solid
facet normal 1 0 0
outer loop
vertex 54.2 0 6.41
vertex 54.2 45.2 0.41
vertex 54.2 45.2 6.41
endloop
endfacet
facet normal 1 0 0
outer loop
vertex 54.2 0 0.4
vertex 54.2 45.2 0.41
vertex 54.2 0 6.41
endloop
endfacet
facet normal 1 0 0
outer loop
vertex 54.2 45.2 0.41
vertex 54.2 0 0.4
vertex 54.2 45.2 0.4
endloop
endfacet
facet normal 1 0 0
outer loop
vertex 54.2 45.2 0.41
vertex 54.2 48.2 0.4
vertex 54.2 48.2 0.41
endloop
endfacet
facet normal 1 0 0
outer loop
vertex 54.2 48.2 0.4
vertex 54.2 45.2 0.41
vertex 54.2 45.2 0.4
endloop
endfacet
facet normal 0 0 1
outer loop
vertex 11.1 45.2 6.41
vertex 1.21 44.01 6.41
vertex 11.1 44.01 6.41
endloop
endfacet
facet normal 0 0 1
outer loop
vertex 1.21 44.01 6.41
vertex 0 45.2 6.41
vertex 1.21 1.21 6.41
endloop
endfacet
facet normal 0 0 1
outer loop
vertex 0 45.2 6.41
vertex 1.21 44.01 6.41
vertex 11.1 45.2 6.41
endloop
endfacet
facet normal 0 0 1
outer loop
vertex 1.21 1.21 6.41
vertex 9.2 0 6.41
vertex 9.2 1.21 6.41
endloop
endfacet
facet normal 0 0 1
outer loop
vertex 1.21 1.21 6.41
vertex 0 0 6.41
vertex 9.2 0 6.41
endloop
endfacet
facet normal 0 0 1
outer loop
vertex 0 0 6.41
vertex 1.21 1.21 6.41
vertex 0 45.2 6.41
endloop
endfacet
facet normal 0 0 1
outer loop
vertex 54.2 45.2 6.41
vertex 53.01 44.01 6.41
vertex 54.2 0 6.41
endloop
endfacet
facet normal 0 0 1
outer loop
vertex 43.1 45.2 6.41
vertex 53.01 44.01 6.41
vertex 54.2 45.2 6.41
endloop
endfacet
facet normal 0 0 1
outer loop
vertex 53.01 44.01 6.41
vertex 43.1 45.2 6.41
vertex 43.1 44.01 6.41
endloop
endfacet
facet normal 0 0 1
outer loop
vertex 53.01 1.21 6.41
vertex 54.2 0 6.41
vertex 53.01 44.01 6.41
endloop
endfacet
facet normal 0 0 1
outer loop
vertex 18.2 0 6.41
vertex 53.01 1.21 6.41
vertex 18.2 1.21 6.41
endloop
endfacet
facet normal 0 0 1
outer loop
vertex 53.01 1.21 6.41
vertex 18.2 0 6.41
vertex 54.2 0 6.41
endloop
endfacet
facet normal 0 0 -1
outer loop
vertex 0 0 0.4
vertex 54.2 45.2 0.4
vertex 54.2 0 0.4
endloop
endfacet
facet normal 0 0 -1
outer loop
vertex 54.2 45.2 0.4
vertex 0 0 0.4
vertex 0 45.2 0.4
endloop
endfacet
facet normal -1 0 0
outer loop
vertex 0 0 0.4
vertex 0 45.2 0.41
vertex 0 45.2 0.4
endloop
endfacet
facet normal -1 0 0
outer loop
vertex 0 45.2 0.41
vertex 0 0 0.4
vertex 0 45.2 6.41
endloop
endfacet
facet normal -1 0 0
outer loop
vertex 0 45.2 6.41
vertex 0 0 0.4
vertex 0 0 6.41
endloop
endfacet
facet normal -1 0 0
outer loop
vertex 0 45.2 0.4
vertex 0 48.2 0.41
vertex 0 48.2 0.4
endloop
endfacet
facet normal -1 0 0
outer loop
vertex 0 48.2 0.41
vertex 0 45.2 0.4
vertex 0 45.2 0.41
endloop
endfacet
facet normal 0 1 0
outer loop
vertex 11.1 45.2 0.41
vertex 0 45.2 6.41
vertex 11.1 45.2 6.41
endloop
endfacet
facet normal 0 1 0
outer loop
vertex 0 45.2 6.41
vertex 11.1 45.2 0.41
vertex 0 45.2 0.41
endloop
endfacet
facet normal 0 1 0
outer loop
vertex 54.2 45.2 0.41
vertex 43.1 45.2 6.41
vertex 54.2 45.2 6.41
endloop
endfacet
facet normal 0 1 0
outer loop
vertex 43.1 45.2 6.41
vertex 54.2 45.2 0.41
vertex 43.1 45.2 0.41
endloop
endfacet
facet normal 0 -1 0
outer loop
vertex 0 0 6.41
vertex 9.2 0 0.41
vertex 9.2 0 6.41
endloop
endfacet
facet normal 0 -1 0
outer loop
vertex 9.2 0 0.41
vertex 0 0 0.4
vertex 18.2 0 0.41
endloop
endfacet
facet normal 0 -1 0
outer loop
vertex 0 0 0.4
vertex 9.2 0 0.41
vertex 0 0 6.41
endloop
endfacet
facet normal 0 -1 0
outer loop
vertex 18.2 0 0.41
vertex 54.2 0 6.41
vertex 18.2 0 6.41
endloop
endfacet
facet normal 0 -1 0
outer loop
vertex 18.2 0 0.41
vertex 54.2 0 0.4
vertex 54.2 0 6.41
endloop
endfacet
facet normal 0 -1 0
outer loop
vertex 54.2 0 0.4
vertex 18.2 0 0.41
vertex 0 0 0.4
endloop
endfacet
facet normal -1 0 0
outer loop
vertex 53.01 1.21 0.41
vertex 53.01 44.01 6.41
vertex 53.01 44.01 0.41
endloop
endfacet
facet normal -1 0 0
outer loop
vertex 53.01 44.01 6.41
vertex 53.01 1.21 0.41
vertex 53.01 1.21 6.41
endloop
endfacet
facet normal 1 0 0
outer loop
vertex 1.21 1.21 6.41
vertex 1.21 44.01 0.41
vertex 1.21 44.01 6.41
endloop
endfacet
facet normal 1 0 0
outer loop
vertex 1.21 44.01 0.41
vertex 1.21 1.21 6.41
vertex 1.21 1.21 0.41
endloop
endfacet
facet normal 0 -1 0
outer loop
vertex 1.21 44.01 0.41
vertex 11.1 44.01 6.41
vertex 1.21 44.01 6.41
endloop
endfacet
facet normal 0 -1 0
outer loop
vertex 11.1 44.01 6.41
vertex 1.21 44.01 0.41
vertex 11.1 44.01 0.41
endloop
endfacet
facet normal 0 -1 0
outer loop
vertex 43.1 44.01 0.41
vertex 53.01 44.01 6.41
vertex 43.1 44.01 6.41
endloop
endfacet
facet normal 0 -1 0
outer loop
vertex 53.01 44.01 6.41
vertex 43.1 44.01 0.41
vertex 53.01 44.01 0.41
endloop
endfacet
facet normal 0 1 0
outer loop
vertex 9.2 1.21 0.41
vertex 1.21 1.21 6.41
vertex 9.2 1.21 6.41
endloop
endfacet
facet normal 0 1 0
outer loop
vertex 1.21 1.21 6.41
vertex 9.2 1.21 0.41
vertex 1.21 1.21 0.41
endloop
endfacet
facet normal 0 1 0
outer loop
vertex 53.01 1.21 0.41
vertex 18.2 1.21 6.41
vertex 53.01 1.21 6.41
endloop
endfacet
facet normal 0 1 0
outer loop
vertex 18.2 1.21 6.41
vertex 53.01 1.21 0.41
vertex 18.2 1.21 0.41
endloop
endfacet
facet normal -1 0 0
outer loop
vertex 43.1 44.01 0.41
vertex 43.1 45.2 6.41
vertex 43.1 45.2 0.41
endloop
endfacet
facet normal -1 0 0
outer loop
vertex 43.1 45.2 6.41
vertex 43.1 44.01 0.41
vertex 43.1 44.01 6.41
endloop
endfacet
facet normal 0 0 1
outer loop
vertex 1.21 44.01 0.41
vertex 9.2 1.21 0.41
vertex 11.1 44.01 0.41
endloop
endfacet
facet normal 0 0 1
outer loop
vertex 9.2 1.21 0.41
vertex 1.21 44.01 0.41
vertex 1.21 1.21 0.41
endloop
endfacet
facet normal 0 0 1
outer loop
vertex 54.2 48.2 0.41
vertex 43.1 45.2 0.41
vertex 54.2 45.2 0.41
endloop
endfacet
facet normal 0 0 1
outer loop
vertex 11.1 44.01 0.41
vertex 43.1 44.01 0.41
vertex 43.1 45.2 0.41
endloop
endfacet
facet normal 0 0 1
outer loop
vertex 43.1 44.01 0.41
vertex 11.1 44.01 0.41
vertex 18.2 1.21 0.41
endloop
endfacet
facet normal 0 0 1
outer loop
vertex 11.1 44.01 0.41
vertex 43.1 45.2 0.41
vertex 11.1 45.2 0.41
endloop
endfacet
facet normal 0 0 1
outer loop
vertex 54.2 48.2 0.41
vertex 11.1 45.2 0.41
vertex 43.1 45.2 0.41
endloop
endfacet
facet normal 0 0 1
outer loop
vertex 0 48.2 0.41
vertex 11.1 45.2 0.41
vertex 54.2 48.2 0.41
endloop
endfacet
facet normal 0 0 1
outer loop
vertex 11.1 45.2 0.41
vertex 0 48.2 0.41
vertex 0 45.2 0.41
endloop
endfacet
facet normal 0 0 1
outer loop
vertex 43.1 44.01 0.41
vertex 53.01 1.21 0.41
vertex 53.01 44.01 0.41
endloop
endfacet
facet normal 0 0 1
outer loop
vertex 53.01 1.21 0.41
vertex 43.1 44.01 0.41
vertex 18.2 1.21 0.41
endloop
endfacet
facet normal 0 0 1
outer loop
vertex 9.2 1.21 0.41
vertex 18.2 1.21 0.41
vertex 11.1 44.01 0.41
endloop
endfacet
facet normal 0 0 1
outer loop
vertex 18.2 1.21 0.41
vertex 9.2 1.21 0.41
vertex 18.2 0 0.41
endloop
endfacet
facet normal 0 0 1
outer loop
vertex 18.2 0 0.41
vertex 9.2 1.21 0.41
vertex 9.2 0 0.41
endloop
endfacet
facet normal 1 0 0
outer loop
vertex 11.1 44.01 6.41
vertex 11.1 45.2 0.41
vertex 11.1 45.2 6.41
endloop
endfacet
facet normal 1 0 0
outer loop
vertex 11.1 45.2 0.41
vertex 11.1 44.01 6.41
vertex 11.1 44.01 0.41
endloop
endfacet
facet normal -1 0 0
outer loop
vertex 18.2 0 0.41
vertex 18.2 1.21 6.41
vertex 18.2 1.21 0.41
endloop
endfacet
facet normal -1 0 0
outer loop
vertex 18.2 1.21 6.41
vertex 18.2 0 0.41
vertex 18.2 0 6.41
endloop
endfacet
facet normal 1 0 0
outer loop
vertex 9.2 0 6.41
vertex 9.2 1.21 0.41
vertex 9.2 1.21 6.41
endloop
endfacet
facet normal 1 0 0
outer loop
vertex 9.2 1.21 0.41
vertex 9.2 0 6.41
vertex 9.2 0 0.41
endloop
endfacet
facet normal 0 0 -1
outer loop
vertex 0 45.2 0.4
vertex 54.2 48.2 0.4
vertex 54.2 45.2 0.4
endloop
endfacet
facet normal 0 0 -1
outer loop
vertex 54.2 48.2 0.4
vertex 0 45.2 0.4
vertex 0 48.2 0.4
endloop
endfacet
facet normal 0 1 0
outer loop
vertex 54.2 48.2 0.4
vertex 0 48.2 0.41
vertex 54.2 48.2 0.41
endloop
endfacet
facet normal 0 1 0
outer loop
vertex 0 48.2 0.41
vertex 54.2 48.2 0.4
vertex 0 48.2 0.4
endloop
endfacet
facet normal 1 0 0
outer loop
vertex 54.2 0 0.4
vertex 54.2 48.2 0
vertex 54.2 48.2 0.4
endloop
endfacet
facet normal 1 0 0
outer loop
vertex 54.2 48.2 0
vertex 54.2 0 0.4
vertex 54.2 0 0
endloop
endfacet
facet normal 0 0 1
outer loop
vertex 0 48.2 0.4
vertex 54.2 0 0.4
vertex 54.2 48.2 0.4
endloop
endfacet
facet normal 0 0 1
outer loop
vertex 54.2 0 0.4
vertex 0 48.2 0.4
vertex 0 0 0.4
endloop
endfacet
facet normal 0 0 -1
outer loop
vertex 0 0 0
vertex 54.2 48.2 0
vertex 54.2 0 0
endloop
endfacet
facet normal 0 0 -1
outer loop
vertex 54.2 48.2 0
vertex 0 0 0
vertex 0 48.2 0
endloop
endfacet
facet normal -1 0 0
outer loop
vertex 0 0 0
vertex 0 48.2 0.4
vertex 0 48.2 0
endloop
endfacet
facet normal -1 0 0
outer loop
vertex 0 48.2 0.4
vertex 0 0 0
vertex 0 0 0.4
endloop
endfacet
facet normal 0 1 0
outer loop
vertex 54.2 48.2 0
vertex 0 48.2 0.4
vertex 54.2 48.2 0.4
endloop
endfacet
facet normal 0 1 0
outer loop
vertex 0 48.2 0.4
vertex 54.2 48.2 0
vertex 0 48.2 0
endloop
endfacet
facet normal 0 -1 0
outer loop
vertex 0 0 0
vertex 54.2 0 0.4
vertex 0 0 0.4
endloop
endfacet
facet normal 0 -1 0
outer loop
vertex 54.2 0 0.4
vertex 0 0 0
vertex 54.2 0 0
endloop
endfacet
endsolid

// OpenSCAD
// file: ../../Base/Boxes.scad
// Fischertechnik Box Foundation
// Pre-designed Boxes

use <Constants.scad>

include <PlacementOptions.scad>

box190Width = 190;
box190Depth = 130;
box130Width = 130;
box130Depth = 95;

// Values are from an original ec3 box
topBottomDifference = 1.5;
outerHeight = 40;
innerHeight = 38.2;
baseThickness = outerHeight - innerHeight;
stackExcess = 5.7;
radius = 3.5;
wallThickness = 1.5;
tolerance = 0.2;
stackOffset = innerHeight - stackExcess;

boxUsageHeight = stackOffset;
boxWallThickness = wallThickness;
boxBaseThickness = baseThickness;
boxWebWidth = 3.0;

// getBoxWallThickness()
// Gets the wall thickness of a Fischertechnik Box
function getBoxWallThickness() = boxWallThickness;

// getBoxUsageHeight()
// Gets the usable height of a Fischertechnik box
function getBoxUsageHeight() = boxUsageHeight;

// getBoxInnerHeight()
// Gets the inner height of a Fischertechnik box, including the stack excess
function getBoxInnerHeight() = innerHeight;

// getBoxBaseThickness()
// Gets the thickness of the Fischertechnik box base.
function getBoxBaseThickness() = boxBaseThickness;

// getBoxWebWidth()
// Gets the width of a box web
function getBoxWebWidth() = boxWebWidth;

// getBox190Space()
// Gets the usable inner space of a Box 190 as an x/y-list
function getBox190Space() = [
    box190Width - 2*getBoxWallThickness() - topBottomDifference, 
    box190Depth - 2*getBoxWallThickness() - topBottomDifference ];

// BoxBase(width, depth)
// Creates an empty stackable Fischertechnik compatible box
// width = Outer width of the box (190, 130, ...)
// depth = Outer depth of the box (130, 95, ...)

module BoxBase(width, depth, height=outerHeight) {    
    thinPlate = 0.01;

    innerHeight = height - baseThickness;    
    
    module BodyPlate(width, depth) {
        translate([radius, radius])
        hull() {
            w = width-2*radius;
            d = depth-2*radius;
            cube([w, d, thinPlate]);
            cylinder(thinPlate, r=radius, $fn=getFragments());
            translate([w, 0])
                cylinder(thinPlate, r=radius, $fn=getFragments());
            translate([w, d])
                cylinder(thinPlate, r=radius, $fn=getFragments());
            translate([0, d])
                cylinder(thinPlate, r=radius, $fn=getFragments());
        }
    }
    
    module Body(tolerance=tolerance) {
        hull() {
            // Bottom with tolerance to fit into the original boxes when stacked
            translate([-wallThickness+tolerance, -wallThickness+tolerance, -baseThickness])
                BodyPlate(width-topBottomDifference-2*tolerance, depth-topBottomDifference-2*tolerance);
            
            // Top
            translate([-wallThickness-topBottomDifference/2, -wallThickness-topBottomDifference/2, innerHeight-thinPlate])
                BodyPlate(width, depth);
         }
    }

    module Cutoff() {
        hull() {
            coWidth = width - 2*wallThickness;
            coDepth = depth - 2*wallThickness;
            
            // Bottom
            BodyPlate(coWidth-topBottomDifference, coDepth-topBottomDifference);

            // Top
            translate([-topBottomDifference/2, -topBottomDifference/2, innerHeight+thinPlate]) 
                BodyPlate(coWidth, coDepth);
        }
    }
    
    difference() {        
        Body();
        Cutoff();
        stackOffset = innerHeight - stackExcess;
        translate([0, 0, stackOffset + baseThickness])
            Body(tolerance=0);
    }
}

// Creates the Fischertechnik empty box 130x190 mm and places it at position 0,0
// 190x130 are the outer sizes, the inner space is slightly smaller. Use getBox190Space() to get the inner sizes.
// The box is positioned that the usable inner space is at the 0,0,0 position. The

module Box190() {
    BoxBase(box190Width, box190Depth);
}

// Gets the usable inner space of a Box 130 as an x/y-list
function getBox130Space() = [
    box130Width - 2*getBoxWallThickness() - topBottomDifference, 
    box130Depth - 2*getBoxWallThickness() - topBottomDifference ];

// Creates the Fischertechnik empty box 95x130 mm and places it at position 0,0
// 190x130 are the outer sizes, the inner space is slightly smaller. Use getBox190Space() to get the inner sizes.
// The box is positioned that the usable inner space is at the 0,0,0 position. The

module Box130() {
    BoxBase(box130Width, box130Depth);
}

// Creates a web at the specified box walls
// corner 0 = LowerLeft, 1 = UpperLeft, 2 = UpperRight, 3 = LowerRight
// side 0 = LeftOfCorner, 1 = RightOfCorner
// distance = Distance in mm from the corner
// boxSpace = inner width and depth of the box (default: Box 190)
// webWidth = length of the web (default is 3 mms)
// webThickness = thickness of the web (default is 1 mm)

module BoxWeb(corner, side, distance, boxSpace=getBox190Space(), webWidth=getBoxWebWidth(), webThickness=1.0) {
    sink = getBoxWallThickness()/2;

    width = (corner % 2 == 0) ? 
            (side == LeftOfCorner ? webWidth : webThickness) :
            (side == LeftOfCorner ? webThickness : webWidth);

    depth = (corner % 2 == 0) ? 
            (side == RightOfCorner ? webWidth : webThickness) :
            (side == RightOfCorner ? webThickness : webWidth);
    
    xDiff = corner == LowerLeft ? 
                (side == LeftOfCorner ? -sink : distance) :
            (corner == UpperLeft ?                
                (side == LeftOfCorner ? distance : -sink) :
            (corner == UpperRight ?
                (side == LeftOfCorner ? boxSpace.x-webWidth+sink : boxSpace.x-distance-webThickness) :
                (side == LeftOfCorner ? boxSpace.x-distance-webThickness: boxSpace.x-webWidth+sink)));

    yDiff = corner == LowerLeft ? 
                (side == RightOfCorner ? -sink : distance) :
            (corner == UpperLeft ?
                (side == RightOfCorner ? boxSpace.y-distance : boxSpace.y-webWidth+sink) :
            (corner == UpperRight ?
                (side == RightOfCorner ? boxSpace.y-webWidth+sink : boxSpace.y-distance) :
                (side == RightOfCorner ? distance : -sink)));
    
    translate([xDiff, yDiff, -getExcess()])
        cube([width, depth, boxUsageHeight + 2*getExcess()]);
}
// file: ../../Base/Rotation.scad
// Fischertechnik Box Foundation
// Geometry Helpers Rotation

include <PlacementOptions.scad>

// getRotatedSpace(space, rotation=NoRotation)
// Rotates the space dependent on the specified rotation

function getRotatedSpace(space, rotation=NoRotation) = [
    (rotation == Rotate90 || rotation == Rotate270) ? space.y : space.x,
    (rotation == Rotate90 || rotation == Rotate270) ? space.x : space.y
];

// Rotates the given space around the fixed left lower corner
// space = the space the children needs as width/depth list [width,depth]
// rotation = 0 Rotate0 degrees, 1 Rotate90 degrees, 2 Rotate180 degrees, 3 Rotate270 degrees (equivalent to -90)

module RotateFix(space, rotation=NoRotation) {
    dy = (rotation == Rotate0 || rotation == Rotate270) ? 0 :
        (rotation == Rotate90) ? space.x :
        space.y;
    dx = (rotation < Rotate180) ? 0 :
        (rotation == Rotate180) ? space.x :
        space.y;
    
    translate([dx, dy, 0])
        rotate([0, 0, rotations[rotation]])
            children();
}
// file: ../../Base/Alignment.scad
// Fischertechnik Box Foundation
// Geometry Helpers Alignment

include <PlacementOptions.scad>

// getAlignedX(elementWidth, spaceWidth, align=AlignRight, offset=0)
// Gets the aligned X offset of an element with the given
// width in the given space.
// elementWidth = The width of the element to positon
// spaceWidth = The space where the element should be aligned
// align = 0 AlignLeft, 1 AlignCenter, 2 AlignRight
// offset = an optional offset from the aligned position. When
// aligned left or centered, then positive values are in X direction.
// When aligned right then positive values are in negative X direction.

function getAlignedX(elementWidth, spaceWidth, align=AlignRight, offset=0) =
    (align == AlignLeft) ?
        offset :
        ((align == AlignCenter) ?
        (spaceWidth - elementWidth)/2 + offset :
        spaceWidth - offset - elementWidth);

// getAlignedY(elementDepth, spaceDepth, align=AlignTop, offset=0)
// Gets the aligned Y offset of an element with the given
// depth in the given space.
// elementDepth = The depth of the element to positon
// spaceDepth = The space where the element should be aligned
// align = 0 AlignBottom, 1 AlignCenter, 2 AlignTop
// offset = an optional offset from the aligned position. When
// aligned bottom or centered, then positive values are in Y direction.
// When aligned top then positive values are in negative Y direction.

function getAlignedY(elementDepth, spaceDepth, align=AlignTop, offset=0) =
    (align == AlignBottom) ?
        offset :
        ((align == AlignCenter) ?
        (spaceDepth - elementDepth)/2 + offset :
        spaceDepth - offset - elementDepth);
// file: ../../Base/PlacementOptions.scad
// Fischertechnik Box Foundation
// Placement Options

// Alignment
NoAlign = 0;
AlignLeft = 1;
AlignBottom = 2;
AlignCenter = 3;
AlignRight = 4;
AlignTop = 5;

// Element rotation degree steps
rotations = [0, -90, -180, -270];

// Rotation
NoRotation = 0;
Rotate0 = 0;
Rotate90 = 1;
Rotate180 = 2;
Rotate270 = 3;

// Docking (seen from above)
NoDock = -1;
DockLeft = 0;
DockTop = 1;
DockRight = 2;
DockCorner = 2;
DockBottom = 3;

// Web corners
LowerLeft = 0;
UpperLeft = 1;
UpperRight = 2;
LowerRight = 3;

// Web position relative to corner
LeftOfCorner = 0;
RightOfCorner = 1;
// file: ../../Base/Placement.scad
// Fischertechnik Box Foundation
// Geometry Helpers Placement

use <Constants.scad>
use <Alignment.scad>
use <Rotation.scad>
use <Boxes.scad>

include <PlacementOptions.scad>

// Place(x=0, y=0, elementSpace=[0,0], alignX=AlignLeft, alignY=AlignBottom, rotation=Rotate0, boxSpace=getBox190Space())
// Places the child at the specified position
// y = Y-Position. This is a relative position when an X aligment is specified.
// x = X-Position. This is a relative position when an Y aligment is specified.
// elementSpace = space of the element to be placed [x,y]
// alignX = -1=NoAlign, 0 AlignLeft, 1 AlignCenter, 3 AlignRight (elementSpace and boxSpace required!)
// alignY = -1=NoAlign, 2 AlignBottom, 1 AlignCenter, 4 AlignTop (elementSpace and boxSpace required!)
// rotation = 0 Rotate0 0 degrees, 1 Rotate90 90 degrees, 
// 2 Rotate180 180 degrees, 3 Rotate270 270 degrees (equivalent to -90)
// boxSpace = Inner space of the box where the placement occurs [x,y] - default is Box 190x130 inner space

module Place(x=0, y=0, elementSpace=[0,0], 
  alignX=AlignLeft, alignY=AlignBottom, 
  rotation=NoRotation, boxSpace=getBox190Space()) {

    module Position(x, y, space, rotation=Rotate0) {
        translate([x, y, 0])
            RotateFix(space, rotation)
                children();
    }

    space = getRotatedSpace(elementSpace, rotation);
    alignedX = getAlignedX(space.x, boxSpace.x, alignX, x);
    alignedY = getAlignedY(space.y, boxSpace.y, alignY, y);
    Position(alignedX, alignedY, elementSpace, rotation)
        children();
}

// Center(space=getBox130Space(), elementSpace=[0,0])
// space = Space where the children is centered. For cylinder use centered=true and no elementSpace.
// elementSpace = space of the element to be centered [x,y]

module Center(space=getBox190Space(), elementSpace=[0,0]) {
    Place(elementSpace=elementSpace, boxSpace=space, alignX=AlignCenter, alignY=AlignCenter)
        children();
}

// CenterHorizontal(width=0, y=0, offset=0, space=getBox130Space())
// width = Width of the element to be placed.
// y = Y position of the element
// offset = Offset from the center position (negative will be left of the center)
// space = Space where the element is placed

module CenterHorizontal(width=0, y=0, offset=0, space=getBox190Space()) {
    Place(x=offset, y=y, elementSpace=[width, 0], boxSpace=space, alignX=AlignCenter)
        children(0);
}

// CenterVertical(depth=0, x=0, offset=0, space=getBox130Space())
// depth = Depth of the element to be placed.
// x = X position of the element
// offset = Offset from the center position (negative will be down of the center)
// space = Space where the element is placed

module CenterVertical(depth=0, x=0, offset=0, space=getBox190Space()) {
    Place(x=x, y=offset, elementSpace=[0, depth], boxSpace=space, alignY=AlignCenter)
        children(0);
}

// getIsVertical(align)
// True if the specified alignment needs a vertical orientation for a divider (AlignRight, AlignLeft)

function getIsVertical(align) = (align == AlignRight || align == AlignLeft);

// getIsHorizontal(align)
// True if the specified alignment needs a horizontal orientation for a divider (AlignTop, AlignBottom)

function getIsHorizontal(align) = (align == AlignTop || align == AlignBottom);
// file: ../../Elements/AxisClip10.scad
// Fischertechnik Box Library
// Axis for clip 10
// 31023

use <../ModelBase/Simple.scad>
use <../Base/Constants.scad>

width = 12;
depth = 12;
height = 23;
upperDiameter = 3.6;
clipHeight = 10;

// getAxisClip10Space()
// Gets the space of a frame for a clip 10 with spring ring (mot2)

function getAxisClip10Space() = [width, depth, height];

// AxisClip10(height, clipHeight)
// Axis for clip 10 with spring ring (mot2)
// height = Height of the complete axis
// clipHeight = Height of the rt for the clip (standard is 10, in mot3 its only 7)

module AxisClip10(height=height, clipHeight=clipHeight) {
    LeveledAxisWithSpace(height, height-clipHeight, getAxisClip10Space(), diameter=upperDiameter);
}

// Tests
color("lightgray")
AxisClip10();
// file: ../../Base/Constants.scad
// Fischertechnik Box Foundation
// Constants

// Constant values necessary for multiple elements

// Base constants
dividerThickness = 1.2;
excess = 0.01;
fragments = 90;
tolerance = 0.8;

// Gets the thickness of a divider 
function getDividerThickness() = dividerThickness;

// Gets the excess that is used to merge walls into each other
function getExcess() = excess;

// Gets amount of fragments of a cylinder
function getFragments() = fragments;

// Gets the inner tolerance of a frame to each side
function getTolerance() = tolerance;


// Fischertechnik specific constants
axisDiameter = 4;
axisBottomDiameter = axisDiameter + 1;
standardEdgeDistance = 2.5;
standardWebDistance = 11.5;
standardCornerLength = 15;
tubeWallFactor = 0.8;
smallPartsFrameHeight = 20;

// Gets axis diameter
function getAxisDiameter() = axisDiameter;

// Gets axis bottom diameter for thicker part at the bottom
function getAxisBottomDiameter() = axisBottomDiameter;

// gets the standard distance to the wall of the box for dockable frames with webs
function getStandardEdgeDistance() = standardEdgeDistance;

// gets the standard distance of each web to the corner of the dockable frame
function getStandardWebDistance() = standardWebDistance;

// gets the standard length of the corner walls of a dockable frame
function getStandardCornerLength() = standardCornerLength;

// gets the wall thickness of a tube.
function getTubeWallThickness() = tubeWallFactor * getDividerThickness();

// gets the frame height for docked small parts boxes.
function getSmallPartsFrameHeight() = smallPartsFrameHeight;
// file: ../../Elements/FrameMotor6V.scad
// Fischertechnik Box Library
// Frame for Motor 6V
// 31039

use <../Base/Constants.scad>
use <../Base/Placement.scad>
use <../ModelBase/Simple.scad>

include <../Base/PlacementOptions.scad>

width = 51;
depth = 42;
height = 6;

connectionDepth = 3;

// getFrameUniversalJointCardanSpace()
// Gets the complete space of the 6V motor frame

function getFrameMotor6VSpace() = getFrameOuterVolume([width, depth + connectionDepth, height]);

// FrameMotor6V()
// Frame for the 6V standard motor (as mot1)

module FrameMotor6V() {
    Space(getFrameMotor6VSpace());
    difference() {
        Frame([width, depth, height]);
    
        connectorCutoffWidth = 32;
        connectCutoffVolume = [connectorCutoffWidth, 6, height + 1];
        Place(
            boxSpace=getFrameMotor6VSpace(), 
            elementSpace=connectCutoffVolume,
            alignX=AlignCenter, alignY=AlignTop)
            cube(connectCutoffVolume);
        
        cableCutoffWidth = 9;
        cableCutoffOffset = 8;
        cableCutoffVolume = [cableCutoffWidth, 2*getDividerThickness(), height + 1];
        Place(
            x=cableCutoffOffset + getDividerThickness(),
            y = -getDividerThickness()/2,
            boxSpace=getFrameMotor6VSpace(), 
            elementSpace=cableCutoffVolume)
            cube(cableCutoffVolume);        
    }
}

// Test
color("lightgray")
FrameMotor6V();
// file: ../TestPrint.scad
// 3D Print Test Base

use <../Base/Constants.scad>

use <../Elements/AxisClip10.scad>

module TestPrint(elementSpace) {
    cube([elementSpace.x, elementSpace.y, 0.4]);
    translate([0,0,0.4+getExcess()]) {
        children();
    }
}

TestPrint(getAxisClip10Space())
    AxisClip10();
// main file
// 3D Print Test
// FrameMotor6V

use <../TestPrint.scad>
use <../../Elements/FrameMotor6V.scad>

TestPrint(getFrameMotor6VSpace())
    FrameMotor6V();
